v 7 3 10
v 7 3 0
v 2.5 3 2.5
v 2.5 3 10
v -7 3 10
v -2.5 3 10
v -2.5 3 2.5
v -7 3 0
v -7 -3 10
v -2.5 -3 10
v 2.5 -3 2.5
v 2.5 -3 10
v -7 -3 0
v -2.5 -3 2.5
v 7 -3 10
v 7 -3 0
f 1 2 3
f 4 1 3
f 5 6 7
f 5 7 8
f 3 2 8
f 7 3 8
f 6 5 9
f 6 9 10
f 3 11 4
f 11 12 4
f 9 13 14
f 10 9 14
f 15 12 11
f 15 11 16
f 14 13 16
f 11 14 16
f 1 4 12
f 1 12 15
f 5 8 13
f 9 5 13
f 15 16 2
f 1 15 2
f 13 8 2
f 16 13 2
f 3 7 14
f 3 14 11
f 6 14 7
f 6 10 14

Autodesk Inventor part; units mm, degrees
ref_plane "YZ Plane" through (0, 0, 0) normal (1, 0, 0) x (0, 1, 0)
ref_plane "XZ Plane" through (0, 0, 0) normal (0, 1, 0) x (-1, 0, 0)
ref_plane "XY Plane" through (0, 0, 0) normal (0, 0, 1) x (1, 0, 0)
sketch "Sketch1" plane through (0, 0, 0) normal (0, 0, 1) x (1, 0, 0)
  line L0 (-7, -3) -> (7, -3)
  line L1 (7, -3) -> (7, 3)
  line L2 (7, 3) -> (-7, 3)
  line L3 (-7, 3) -> (-7, -3)
  line L4 (-7, -3) -> (7, 3) construction
  line L5 (7, -3) -> (-7, 3) construction
  point P0 (0, 0)
  dimension "d0" = 14
  dimension "d1" = 6
extrude "Extrusion1" add sketch "Sketch1" along normal blind 10
sketch "Sketch2" plane through (0, 0, 10) normal (0, 0, 1) x (1, 0, 0)
  line L0 (-2.5, 0) -> (-2.5, 3)
  line L1 (7, 3) -> (-7, 3) projected
  line L2 (-2.5, 0) -> (-2.5, -3)
  line L3 (-7, -3) -> (7, -3) projected
  line L4 (2.5, 0) -> (2.5, 3)
  line L5 (2.5, 0) -> (2.5, -3)
  point P0 (0, 0)
extrude "Extrusion2" cut sketch "Sketch2" against normal blind 7.5
properties part number "opto"
